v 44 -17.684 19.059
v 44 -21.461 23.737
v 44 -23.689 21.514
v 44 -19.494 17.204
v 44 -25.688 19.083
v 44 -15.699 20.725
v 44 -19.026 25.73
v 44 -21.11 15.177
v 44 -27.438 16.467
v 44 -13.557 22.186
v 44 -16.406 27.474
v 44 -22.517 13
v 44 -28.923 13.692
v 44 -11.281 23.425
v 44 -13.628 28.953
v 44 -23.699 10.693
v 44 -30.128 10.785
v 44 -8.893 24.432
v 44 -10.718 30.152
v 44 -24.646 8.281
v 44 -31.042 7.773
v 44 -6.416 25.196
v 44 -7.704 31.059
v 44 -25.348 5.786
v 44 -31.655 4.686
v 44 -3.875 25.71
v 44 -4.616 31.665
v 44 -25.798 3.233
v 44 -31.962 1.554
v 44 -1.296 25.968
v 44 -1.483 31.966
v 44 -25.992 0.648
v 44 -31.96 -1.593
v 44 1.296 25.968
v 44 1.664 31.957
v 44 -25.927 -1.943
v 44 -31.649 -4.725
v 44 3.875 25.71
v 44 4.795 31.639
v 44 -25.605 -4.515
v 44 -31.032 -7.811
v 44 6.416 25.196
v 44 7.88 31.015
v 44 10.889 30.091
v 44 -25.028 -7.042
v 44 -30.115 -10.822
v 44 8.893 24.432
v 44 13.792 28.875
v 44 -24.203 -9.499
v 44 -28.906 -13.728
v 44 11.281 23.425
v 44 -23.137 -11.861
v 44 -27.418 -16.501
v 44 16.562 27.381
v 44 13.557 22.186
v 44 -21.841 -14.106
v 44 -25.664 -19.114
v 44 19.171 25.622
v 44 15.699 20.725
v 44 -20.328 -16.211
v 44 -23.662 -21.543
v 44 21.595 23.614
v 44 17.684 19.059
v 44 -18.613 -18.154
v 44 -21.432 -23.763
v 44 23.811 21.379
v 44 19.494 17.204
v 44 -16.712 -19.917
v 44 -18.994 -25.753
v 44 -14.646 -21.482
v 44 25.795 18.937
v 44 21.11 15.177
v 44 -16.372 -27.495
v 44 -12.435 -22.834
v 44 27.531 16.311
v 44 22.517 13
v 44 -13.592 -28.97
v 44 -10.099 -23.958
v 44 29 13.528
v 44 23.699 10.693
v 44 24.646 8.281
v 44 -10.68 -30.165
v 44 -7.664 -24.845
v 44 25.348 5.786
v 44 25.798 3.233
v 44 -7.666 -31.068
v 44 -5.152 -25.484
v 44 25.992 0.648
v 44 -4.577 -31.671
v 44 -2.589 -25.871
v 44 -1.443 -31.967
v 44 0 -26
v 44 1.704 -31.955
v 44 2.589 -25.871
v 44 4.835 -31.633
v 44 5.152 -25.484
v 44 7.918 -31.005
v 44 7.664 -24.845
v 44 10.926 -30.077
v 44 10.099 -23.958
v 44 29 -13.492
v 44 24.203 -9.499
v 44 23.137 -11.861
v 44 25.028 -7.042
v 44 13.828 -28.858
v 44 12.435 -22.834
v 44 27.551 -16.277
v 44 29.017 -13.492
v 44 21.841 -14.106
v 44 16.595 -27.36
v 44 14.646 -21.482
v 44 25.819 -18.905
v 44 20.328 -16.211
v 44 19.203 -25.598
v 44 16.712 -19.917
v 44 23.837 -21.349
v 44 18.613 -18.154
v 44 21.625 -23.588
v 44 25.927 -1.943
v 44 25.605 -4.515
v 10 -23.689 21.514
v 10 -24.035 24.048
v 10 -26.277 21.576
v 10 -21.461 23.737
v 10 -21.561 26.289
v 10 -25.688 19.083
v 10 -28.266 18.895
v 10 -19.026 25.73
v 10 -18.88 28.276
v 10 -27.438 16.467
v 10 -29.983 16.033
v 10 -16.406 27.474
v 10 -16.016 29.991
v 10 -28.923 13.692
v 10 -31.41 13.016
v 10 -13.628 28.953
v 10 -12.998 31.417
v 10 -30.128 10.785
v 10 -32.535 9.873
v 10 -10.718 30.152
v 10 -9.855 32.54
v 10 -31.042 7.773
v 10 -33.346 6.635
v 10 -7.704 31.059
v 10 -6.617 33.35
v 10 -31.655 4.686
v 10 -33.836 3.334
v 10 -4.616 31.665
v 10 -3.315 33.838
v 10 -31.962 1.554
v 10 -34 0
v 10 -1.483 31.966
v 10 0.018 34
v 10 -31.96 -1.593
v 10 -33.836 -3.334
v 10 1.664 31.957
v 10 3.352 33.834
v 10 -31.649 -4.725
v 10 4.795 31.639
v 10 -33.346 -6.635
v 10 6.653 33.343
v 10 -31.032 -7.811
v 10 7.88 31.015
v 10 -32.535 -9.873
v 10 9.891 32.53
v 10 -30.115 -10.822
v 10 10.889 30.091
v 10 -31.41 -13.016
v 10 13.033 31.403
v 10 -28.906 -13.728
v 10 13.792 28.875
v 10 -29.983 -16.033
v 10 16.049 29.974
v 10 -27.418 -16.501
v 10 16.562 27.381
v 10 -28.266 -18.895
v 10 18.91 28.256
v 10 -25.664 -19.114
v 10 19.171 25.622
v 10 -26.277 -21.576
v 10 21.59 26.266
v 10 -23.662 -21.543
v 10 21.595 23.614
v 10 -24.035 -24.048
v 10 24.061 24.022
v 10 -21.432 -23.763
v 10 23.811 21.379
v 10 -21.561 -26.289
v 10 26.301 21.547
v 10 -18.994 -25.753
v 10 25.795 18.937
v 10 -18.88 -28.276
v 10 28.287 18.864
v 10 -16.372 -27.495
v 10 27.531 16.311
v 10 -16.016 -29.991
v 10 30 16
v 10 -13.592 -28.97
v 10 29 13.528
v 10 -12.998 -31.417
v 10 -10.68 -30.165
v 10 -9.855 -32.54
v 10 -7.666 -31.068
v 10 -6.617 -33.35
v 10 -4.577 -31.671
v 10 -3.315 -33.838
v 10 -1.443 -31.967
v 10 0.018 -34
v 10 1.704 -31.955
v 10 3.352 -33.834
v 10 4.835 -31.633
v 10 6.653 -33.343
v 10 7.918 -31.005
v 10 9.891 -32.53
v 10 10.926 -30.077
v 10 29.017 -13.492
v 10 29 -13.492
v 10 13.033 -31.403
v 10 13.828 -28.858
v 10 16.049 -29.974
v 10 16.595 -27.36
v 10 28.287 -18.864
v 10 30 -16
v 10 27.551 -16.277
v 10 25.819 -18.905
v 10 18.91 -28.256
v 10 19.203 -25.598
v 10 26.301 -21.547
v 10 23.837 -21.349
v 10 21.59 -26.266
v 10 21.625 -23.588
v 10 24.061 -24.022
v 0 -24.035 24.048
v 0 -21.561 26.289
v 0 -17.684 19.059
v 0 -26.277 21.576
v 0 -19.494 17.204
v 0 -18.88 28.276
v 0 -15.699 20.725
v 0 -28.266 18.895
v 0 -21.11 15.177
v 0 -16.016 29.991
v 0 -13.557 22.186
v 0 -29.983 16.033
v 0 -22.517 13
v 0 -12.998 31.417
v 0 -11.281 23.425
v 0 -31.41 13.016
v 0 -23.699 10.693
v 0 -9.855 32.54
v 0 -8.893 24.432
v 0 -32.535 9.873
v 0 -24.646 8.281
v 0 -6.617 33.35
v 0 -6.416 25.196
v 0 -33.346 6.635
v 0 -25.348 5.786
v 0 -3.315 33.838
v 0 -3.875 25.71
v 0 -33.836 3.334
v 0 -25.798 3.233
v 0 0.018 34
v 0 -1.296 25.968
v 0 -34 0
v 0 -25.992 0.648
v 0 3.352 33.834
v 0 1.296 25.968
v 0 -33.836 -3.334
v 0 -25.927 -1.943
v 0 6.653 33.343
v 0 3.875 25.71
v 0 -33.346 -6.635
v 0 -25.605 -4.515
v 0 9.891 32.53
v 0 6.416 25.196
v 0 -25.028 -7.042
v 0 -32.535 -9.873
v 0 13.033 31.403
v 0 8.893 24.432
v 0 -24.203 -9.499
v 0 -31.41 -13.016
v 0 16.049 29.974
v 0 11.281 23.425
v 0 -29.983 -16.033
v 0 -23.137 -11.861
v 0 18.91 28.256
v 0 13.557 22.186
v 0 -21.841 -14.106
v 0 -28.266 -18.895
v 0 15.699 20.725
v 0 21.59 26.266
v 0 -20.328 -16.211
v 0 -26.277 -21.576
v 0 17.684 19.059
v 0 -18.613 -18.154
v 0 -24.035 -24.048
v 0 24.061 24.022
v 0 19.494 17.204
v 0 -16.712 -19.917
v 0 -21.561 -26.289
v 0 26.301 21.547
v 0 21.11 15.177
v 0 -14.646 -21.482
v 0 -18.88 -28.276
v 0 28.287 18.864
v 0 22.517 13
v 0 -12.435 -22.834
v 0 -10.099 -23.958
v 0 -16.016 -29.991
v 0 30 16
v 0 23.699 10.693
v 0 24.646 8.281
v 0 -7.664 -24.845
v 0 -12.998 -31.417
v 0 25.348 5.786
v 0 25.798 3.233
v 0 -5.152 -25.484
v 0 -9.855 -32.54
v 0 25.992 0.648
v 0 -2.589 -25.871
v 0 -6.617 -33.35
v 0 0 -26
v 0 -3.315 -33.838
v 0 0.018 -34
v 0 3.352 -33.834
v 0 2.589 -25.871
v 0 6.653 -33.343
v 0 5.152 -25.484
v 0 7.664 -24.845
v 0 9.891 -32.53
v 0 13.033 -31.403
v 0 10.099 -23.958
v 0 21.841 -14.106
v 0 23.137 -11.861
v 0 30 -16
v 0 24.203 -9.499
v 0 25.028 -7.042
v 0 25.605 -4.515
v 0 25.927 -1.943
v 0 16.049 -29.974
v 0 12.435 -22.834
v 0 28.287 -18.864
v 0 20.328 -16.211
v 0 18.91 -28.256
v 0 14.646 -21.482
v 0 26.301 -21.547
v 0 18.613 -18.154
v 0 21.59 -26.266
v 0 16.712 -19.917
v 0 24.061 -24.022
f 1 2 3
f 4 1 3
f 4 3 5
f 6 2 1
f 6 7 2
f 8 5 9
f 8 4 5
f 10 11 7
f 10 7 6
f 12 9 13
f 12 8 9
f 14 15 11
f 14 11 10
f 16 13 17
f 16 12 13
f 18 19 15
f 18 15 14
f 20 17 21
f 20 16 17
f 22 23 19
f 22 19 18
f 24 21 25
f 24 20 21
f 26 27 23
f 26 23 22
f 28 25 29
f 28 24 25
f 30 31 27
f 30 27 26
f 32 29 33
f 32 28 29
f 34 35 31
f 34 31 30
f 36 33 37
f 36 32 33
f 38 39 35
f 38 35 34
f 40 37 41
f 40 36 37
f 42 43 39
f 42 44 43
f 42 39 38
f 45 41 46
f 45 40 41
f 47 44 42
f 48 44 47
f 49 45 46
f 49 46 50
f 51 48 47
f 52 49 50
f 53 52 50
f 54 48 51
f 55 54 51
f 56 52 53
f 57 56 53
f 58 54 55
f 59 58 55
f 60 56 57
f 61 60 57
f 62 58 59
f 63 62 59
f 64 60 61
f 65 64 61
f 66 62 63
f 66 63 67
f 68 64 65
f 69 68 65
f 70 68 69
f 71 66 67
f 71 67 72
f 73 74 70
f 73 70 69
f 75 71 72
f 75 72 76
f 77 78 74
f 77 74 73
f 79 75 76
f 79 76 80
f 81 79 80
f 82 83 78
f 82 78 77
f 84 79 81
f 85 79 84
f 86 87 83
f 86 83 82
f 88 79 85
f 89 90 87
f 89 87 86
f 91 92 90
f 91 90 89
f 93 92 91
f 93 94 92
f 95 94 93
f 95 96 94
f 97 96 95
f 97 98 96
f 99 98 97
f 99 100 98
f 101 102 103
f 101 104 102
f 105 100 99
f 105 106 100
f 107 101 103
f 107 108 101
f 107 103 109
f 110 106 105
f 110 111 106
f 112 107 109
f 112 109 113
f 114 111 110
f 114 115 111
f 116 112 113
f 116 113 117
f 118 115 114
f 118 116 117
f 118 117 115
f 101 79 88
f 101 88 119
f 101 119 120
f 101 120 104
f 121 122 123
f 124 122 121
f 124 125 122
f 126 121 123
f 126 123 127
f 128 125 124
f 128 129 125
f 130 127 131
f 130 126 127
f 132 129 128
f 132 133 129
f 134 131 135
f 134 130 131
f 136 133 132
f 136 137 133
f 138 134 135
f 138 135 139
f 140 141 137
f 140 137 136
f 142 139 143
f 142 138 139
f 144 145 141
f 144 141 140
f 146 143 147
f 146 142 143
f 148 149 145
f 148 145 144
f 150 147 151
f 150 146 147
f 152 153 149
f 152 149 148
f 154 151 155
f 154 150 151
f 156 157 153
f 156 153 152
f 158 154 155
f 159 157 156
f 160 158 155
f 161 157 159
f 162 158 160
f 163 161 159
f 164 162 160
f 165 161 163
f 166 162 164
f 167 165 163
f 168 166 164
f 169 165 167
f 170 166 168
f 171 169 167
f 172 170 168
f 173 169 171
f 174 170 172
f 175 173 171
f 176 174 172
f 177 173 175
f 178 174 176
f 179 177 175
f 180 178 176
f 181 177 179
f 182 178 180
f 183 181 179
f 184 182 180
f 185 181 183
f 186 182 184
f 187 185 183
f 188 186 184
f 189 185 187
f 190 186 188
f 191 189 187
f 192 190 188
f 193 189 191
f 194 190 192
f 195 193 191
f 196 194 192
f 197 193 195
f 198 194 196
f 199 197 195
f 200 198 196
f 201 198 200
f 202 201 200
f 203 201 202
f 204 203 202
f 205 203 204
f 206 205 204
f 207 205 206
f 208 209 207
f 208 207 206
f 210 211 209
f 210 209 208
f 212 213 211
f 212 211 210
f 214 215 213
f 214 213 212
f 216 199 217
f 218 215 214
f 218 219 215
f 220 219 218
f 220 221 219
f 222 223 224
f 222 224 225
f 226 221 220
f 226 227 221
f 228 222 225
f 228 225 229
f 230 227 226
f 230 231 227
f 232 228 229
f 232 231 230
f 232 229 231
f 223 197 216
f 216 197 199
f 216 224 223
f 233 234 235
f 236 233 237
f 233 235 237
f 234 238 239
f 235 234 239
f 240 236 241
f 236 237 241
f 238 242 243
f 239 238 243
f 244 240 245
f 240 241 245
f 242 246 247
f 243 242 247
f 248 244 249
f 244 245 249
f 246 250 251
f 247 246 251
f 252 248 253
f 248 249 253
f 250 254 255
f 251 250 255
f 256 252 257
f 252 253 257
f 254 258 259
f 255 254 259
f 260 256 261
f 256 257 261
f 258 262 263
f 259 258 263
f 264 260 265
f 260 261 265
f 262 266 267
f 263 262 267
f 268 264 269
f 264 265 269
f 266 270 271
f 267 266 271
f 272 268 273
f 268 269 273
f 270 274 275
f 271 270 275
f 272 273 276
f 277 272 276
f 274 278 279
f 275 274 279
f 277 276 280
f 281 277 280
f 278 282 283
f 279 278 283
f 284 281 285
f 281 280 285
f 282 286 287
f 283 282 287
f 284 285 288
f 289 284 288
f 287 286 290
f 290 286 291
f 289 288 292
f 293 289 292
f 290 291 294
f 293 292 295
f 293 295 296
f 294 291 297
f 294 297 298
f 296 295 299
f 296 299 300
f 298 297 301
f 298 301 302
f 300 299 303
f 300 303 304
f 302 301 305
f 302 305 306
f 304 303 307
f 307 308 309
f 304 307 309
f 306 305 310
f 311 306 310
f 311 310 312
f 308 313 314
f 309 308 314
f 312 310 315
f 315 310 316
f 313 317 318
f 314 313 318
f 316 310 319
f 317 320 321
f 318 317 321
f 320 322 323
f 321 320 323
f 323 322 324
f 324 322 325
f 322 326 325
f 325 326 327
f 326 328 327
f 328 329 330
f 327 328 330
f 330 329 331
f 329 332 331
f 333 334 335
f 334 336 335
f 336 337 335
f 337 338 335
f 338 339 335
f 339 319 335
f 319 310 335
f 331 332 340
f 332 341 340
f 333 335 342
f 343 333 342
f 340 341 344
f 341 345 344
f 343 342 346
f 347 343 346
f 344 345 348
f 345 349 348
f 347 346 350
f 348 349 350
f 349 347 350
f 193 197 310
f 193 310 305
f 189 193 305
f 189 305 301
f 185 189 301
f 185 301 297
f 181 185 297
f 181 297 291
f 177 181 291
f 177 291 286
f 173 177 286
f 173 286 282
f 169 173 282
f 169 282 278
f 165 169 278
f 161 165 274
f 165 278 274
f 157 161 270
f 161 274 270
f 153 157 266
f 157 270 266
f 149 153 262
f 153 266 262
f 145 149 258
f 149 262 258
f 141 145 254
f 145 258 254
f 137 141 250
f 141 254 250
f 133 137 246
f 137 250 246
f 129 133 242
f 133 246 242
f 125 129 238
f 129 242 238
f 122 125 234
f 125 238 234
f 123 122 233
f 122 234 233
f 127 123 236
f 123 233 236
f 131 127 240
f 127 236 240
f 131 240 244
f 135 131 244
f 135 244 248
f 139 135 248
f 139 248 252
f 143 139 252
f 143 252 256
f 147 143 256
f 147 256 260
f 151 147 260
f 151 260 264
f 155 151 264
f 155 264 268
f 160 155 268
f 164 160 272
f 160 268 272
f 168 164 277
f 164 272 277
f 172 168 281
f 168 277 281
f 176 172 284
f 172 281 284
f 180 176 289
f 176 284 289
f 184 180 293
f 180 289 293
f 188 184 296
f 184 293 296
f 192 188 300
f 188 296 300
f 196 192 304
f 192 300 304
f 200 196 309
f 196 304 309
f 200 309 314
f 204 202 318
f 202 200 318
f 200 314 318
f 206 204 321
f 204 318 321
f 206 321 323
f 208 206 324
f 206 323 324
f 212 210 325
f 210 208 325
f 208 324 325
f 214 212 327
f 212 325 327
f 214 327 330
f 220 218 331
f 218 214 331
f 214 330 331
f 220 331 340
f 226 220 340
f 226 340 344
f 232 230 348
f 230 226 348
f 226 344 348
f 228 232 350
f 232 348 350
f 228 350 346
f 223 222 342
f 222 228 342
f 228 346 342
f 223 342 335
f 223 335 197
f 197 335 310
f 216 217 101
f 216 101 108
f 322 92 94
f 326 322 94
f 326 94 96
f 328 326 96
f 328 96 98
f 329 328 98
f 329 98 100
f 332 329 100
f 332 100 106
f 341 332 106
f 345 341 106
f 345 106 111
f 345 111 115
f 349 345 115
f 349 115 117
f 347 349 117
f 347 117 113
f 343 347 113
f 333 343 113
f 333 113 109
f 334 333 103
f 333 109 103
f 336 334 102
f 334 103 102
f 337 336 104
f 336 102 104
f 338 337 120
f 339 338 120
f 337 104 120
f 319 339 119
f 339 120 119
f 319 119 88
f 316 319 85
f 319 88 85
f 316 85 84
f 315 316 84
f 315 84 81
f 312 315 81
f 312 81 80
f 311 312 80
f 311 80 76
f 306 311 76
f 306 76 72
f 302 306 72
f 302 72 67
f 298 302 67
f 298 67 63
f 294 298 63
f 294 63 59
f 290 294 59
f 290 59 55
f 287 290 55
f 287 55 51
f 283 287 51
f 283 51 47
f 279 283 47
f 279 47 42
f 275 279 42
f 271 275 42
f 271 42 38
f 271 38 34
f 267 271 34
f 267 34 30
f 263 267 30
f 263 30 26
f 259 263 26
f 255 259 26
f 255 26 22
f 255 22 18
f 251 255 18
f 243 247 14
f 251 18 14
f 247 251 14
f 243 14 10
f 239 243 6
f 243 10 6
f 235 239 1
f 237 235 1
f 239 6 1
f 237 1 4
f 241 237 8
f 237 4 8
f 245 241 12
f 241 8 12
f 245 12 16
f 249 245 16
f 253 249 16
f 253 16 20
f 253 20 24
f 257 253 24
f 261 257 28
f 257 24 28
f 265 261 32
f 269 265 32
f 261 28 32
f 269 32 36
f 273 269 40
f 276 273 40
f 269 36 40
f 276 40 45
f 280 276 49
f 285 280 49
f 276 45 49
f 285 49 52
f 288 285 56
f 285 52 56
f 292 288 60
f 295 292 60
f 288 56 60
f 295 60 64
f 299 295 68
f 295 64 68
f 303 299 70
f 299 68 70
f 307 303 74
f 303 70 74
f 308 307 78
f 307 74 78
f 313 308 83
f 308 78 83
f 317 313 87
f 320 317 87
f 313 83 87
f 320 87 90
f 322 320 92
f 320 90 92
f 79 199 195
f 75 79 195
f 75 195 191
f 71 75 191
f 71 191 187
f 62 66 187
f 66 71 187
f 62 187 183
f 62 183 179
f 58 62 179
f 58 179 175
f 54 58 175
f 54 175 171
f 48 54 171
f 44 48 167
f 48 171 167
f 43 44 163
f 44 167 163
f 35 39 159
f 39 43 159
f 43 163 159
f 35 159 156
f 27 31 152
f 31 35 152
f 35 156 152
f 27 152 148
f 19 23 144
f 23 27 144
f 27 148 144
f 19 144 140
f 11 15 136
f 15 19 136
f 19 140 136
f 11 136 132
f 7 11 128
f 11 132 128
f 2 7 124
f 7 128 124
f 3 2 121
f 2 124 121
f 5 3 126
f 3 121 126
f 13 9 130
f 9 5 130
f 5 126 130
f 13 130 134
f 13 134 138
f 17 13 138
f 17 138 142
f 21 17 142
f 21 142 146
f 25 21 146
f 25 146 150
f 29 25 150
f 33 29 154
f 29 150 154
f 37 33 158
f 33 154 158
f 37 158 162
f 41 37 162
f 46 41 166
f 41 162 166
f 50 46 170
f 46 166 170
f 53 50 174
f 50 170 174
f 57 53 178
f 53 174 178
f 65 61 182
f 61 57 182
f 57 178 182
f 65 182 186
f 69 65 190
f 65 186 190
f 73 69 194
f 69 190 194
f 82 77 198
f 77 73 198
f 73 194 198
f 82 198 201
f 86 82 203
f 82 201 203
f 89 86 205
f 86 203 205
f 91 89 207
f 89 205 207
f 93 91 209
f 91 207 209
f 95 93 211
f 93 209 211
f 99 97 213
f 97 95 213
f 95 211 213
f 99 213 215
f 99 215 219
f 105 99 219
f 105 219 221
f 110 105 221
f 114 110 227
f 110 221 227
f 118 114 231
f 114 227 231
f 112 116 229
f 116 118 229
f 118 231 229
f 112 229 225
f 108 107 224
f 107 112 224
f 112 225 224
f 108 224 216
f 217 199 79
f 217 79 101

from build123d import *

# Parameters (mm, degrees)
SKETCH1_R           = 34
BOSS_EXTRUDE1_DEPTH = 10
SKETCH2_R           = 32
BOSS_EXTRUDE2_DEPTH = 34
SKETCH3_R           = 26
CUT_EXTRUDE1_DEPTH  = 66.176682947
SKETCH4_W           = 27.053672336
SKETCH4_H           = 7.688048191
CUT_EXTRUDE2_DEPTH  = 34
CUT_EXTRUDE3_REACH  = 67.177
SKETCH5_W           = 49.442103022
SKETCH5_H           = 7.290390526


with BuildPart() as part:
    # Sketch1 → Boss-Extrude1 (new body)
    with BuildSketch(Plane(origin=(0, 0, 0), x_dir=(0, 0, -1), z_dir=(1, 0, 0))):
        Circle(SKETCH1_R)
    extrude(amount=BOSS_EXTRUDE1_DEPTH)

    # Sketch2 → Boss-Extrude2 (add)
    with BuildSketch(Plane(origin=(10, 0, 0), x_dir=(0, 0, -1), z_dir=(1, 0, 0))):
        Circle(SKETCH2_R)
    extrude(amount=BOSS_EXTRUDE2_DEPTH)

    # Sketch3 → Cut-Extrude1 (cut, through all)
    with BuildSketch(Plane(origin=(44, 0, 0), x_dir=(0, 0, -1), z_dir=(1, 0, 0))):
        Circle(SKETCH3_R)
    extrude(amount=-CUT_EXTRUDE1_DEPTH, mode=Mode.SUBTRACT)

    # Sketch4 → Cut-Extrude2 (cut)
    with BuildSketch(Plane(origin=(44, 0, 0), x_dir=(0, 0, -1), z_dir=(1, 0, 0))):
        with Locations((-0.035028199, 32.844024096)):
            Rectangle(SKETCH4_W, SKETCH4_H)
    extrude(amount=-CUT_EXTRUDE2_DEPTH, mode=Mode.SUBTRACT)

    # Sketch5 → Cut-Extrude3 (cut, up to next)
    with BuildSketch(Plane.ZY, mode=Mode.PRIVATE) as cut_extrude3_sk1:
        with Locations((1.06042044, 33.645195263)):
            Rectangle(SKETCH5_W, SKETCH5_H)
    cut_extrude3_tool1 = extrude(cut_extrude3_sk1.sketch, amount=-CUT_EXTRUDE3_REACH, mode=Mode.PRIVATE) & part.part
    add(cut_extrude3_tool1.solids().sort_by_distance((0, 33.645195, 1.06042))[0], mode=Mode.SUBTRACT)


solid = part.part
